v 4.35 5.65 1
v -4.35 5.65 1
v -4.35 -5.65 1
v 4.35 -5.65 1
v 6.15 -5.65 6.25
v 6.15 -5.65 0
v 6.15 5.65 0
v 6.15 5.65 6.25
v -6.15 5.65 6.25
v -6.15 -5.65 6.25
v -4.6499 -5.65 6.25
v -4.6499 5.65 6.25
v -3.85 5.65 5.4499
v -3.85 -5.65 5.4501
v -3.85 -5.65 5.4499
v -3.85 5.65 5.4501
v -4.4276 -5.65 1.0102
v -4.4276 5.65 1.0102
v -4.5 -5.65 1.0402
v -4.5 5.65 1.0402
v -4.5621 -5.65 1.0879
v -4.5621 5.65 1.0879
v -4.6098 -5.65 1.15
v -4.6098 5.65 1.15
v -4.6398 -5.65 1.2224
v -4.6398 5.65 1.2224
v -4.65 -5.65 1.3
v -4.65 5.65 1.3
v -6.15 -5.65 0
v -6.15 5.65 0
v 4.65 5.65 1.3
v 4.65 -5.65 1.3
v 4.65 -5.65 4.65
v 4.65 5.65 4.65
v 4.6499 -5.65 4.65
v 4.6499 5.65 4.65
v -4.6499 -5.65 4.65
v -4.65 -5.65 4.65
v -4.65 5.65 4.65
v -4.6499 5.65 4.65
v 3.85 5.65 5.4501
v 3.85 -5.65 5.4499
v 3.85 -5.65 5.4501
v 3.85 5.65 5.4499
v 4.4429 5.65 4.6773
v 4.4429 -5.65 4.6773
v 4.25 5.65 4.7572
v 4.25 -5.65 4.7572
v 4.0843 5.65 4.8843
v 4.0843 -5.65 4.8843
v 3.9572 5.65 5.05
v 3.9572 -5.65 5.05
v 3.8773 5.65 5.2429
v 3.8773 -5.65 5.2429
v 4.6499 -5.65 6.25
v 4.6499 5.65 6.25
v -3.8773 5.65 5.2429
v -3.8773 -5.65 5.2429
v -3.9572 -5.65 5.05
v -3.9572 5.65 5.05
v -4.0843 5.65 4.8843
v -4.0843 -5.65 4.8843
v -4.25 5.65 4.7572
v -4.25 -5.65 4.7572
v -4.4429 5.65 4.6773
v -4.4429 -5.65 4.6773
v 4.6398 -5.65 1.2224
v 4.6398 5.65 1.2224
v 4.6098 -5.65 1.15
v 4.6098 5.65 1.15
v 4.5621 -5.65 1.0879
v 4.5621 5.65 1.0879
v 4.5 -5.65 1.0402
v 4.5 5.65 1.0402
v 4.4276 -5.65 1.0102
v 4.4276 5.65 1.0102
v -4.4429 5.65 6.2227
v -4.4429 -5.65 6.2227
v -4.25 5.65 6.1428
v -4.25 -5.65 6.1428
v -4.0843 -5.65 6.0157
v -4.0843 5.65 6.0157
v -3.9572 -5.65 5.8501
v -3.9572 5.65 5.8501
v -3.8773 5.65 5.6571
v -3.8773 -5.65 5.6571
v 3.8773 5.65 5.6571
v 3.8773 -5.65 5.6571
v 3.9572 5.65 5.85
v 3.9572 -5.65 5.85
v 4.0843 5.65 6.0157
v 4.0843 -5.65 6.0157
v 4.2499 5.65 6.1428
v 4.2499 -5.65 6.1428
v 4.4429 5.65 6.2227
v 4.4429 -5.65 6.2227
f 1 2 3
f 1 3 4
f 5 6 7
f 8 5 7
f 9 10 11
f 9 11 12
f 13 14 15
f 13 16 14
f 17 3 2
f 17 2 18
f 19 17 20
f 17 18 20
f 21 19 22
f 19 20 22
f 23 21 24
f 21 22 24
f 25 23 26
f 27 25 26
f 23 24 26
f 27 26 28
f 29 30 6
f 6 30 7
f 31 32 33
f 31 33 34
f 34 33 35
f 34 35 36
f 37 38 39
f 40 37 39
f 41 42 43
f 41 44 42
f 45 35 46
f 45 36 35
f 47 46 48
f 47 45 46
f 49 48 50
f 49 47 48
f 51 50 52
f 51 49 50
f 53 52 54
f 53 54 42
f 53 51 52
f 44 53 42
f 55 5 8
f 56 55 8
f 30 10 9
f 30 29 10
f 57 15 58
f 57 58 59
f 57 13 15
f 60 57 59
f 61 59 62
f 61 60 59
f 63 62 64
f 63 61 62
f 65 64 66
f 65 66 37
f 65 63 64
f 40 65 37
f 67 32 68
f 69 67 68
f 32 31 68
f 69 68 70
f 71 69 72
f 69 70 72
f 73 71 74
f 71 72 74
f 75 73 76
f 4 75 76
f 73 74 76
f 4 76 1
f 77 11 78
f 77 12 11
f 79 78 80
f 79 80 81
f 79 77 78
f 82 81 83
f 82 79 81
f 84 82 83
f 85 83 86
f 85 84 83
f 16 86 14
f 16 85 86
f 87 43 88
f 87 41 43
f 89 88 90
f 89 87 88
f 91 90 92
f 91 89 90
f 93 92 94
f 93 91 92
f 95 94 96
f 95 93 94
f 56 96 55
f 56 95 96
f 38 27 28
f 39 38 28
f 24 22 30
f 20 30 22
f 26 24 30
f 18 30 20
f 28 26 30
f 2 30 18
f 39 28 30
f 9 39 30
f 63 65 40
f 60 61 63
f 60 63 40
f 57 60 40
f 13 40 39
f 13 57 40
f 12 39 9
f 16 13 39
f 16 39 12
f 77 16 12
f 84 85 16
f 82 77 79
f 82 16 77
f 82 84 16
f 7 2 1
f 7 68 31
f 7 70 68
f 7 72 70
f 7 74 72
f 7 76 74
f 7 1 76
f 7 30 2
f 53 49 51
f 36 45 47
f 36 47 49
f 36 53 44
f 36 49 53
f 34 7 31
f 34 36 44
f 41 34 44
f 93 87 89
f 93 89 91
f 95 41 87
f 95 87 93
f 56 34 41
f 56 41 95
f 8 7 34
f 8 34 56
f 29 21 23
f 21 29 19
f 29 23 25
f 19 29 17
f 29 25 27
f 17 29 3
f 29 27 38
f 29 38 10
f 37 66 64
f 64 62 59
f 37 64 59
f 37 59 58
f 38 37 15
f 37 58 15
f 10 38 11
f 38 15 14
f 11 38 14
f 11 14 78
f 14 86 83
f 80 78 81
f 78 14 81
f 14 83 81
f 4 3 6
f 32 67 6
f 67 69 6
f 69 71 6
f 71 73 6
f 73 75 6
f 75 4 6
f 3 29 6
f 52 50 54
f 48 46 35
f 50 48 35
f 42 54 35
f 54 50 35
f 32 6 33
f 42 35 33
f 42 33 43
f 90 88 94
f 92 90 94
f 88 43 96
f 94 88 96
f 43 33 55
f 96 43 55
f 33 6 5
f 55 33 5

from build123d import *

# Parameters (mm, degrees)
SKETCH_1_W          = 12.3
SKETCH_1_H          = 11.3
EXTRUDE_1_DEPTH     = 2
SKETCH_2_W          = 1.5
SKETCH_2_H          = 11.3
EXTRUDE_2_DEPTH     = 4.25
SKETCH_5_W          = 9.3
SKETCH_5_H          = 11.5
CUT_EXTRUDE_1_DEPTH = 1
SKETCH_8_W          = 1.6
SKETCH_8_H          = 11.3
EXTRUDE_5_DEPTH     = 0.8
SKETCH_9_W          = 1.6
SKETCH_9_H          = 11.3
EXTRUDE_6_DEPTH     = 0.8
FILLET_7_R          = 0.8
FILLET_8_R          = 0.3


with BuildPart() as part:
    # 스케치1 → 보스-돌출1 (new body)
    with BuildSketch(Plane.XY):
        Rectangle(SKETCH_1_W, SKETCH_1_H)
    extrude(amount=EXTRUDE_1_DEPTH)

    # 스케치2 → 보스-돌출2 (add)
    with BuildSketch(Plane.XY.offset(2)):
        with Locations((-5.4, 0)):
            Rectangle(SKETCH_2_W, SKETCH_2_H)
        with Locations((5.4, 0)):
            Rectangle(SKETCH_2_W, SKETCH_2_H)
    extrude(amount=EXTRUDE_2_DEPTH)

    # 스케치5 → 컷-돌출1 (cut)
    with BuildSketch(Plane.XY.offset(2)):
        Rectangle(SKETCH_5_W, SKETCH_5_H)
    extrude(amount=-CUT_EXTRUDE_1_DEPTH, mode=Mode.SUBTRACT)

    # 스케치8 → 보스-돌출5 (add)
    with BuildSketch(Plane(origin=(-4.65, 0, 0), x_dir=(0, 0, -1), z_dir=(1, 0, 0))):
        with Locations((-5.45, 0)):
            Rectangle(SKETCH_8_W, SKETCH_8_H)
    extrude(amount=EXTRUDE_5_DEPTH)

    # 스케치9 → 보스-돌출6 (add)
    with BuildSketch(Plane.ZY.offset(-4.65)):
        with Locations((5.45, 0)):
            Rectangle(SKETCH_9_W, SKETCH_9_H)
    extrude(amount=EXTRUDE_6_DEPTH)

    # 필렛7
    fillet_7_edges = [part.edges().sort_by_distance(p)[0] for p in [
        (3.85, 0, 6.25),
        (-3.85, 0, 6.25),
        (3.85, 0, 4.65),
        (-3.85, 0, 4.65),
    ]]
    fillet(fillet_7_edges, radius=FILLET_7_R - 0.0001)  # a hair under: the kernel refuses the full size

    # 필렛8
    fillet_8_edges = [part.edges().sort_by_distance(p)[0] for p in [
        (4.65, 0, 1),
        (-4.65, 0, 1),
    ]]
    fillet(fillet_8_edges, radius=FILLET_8_R)


solid = part.part
